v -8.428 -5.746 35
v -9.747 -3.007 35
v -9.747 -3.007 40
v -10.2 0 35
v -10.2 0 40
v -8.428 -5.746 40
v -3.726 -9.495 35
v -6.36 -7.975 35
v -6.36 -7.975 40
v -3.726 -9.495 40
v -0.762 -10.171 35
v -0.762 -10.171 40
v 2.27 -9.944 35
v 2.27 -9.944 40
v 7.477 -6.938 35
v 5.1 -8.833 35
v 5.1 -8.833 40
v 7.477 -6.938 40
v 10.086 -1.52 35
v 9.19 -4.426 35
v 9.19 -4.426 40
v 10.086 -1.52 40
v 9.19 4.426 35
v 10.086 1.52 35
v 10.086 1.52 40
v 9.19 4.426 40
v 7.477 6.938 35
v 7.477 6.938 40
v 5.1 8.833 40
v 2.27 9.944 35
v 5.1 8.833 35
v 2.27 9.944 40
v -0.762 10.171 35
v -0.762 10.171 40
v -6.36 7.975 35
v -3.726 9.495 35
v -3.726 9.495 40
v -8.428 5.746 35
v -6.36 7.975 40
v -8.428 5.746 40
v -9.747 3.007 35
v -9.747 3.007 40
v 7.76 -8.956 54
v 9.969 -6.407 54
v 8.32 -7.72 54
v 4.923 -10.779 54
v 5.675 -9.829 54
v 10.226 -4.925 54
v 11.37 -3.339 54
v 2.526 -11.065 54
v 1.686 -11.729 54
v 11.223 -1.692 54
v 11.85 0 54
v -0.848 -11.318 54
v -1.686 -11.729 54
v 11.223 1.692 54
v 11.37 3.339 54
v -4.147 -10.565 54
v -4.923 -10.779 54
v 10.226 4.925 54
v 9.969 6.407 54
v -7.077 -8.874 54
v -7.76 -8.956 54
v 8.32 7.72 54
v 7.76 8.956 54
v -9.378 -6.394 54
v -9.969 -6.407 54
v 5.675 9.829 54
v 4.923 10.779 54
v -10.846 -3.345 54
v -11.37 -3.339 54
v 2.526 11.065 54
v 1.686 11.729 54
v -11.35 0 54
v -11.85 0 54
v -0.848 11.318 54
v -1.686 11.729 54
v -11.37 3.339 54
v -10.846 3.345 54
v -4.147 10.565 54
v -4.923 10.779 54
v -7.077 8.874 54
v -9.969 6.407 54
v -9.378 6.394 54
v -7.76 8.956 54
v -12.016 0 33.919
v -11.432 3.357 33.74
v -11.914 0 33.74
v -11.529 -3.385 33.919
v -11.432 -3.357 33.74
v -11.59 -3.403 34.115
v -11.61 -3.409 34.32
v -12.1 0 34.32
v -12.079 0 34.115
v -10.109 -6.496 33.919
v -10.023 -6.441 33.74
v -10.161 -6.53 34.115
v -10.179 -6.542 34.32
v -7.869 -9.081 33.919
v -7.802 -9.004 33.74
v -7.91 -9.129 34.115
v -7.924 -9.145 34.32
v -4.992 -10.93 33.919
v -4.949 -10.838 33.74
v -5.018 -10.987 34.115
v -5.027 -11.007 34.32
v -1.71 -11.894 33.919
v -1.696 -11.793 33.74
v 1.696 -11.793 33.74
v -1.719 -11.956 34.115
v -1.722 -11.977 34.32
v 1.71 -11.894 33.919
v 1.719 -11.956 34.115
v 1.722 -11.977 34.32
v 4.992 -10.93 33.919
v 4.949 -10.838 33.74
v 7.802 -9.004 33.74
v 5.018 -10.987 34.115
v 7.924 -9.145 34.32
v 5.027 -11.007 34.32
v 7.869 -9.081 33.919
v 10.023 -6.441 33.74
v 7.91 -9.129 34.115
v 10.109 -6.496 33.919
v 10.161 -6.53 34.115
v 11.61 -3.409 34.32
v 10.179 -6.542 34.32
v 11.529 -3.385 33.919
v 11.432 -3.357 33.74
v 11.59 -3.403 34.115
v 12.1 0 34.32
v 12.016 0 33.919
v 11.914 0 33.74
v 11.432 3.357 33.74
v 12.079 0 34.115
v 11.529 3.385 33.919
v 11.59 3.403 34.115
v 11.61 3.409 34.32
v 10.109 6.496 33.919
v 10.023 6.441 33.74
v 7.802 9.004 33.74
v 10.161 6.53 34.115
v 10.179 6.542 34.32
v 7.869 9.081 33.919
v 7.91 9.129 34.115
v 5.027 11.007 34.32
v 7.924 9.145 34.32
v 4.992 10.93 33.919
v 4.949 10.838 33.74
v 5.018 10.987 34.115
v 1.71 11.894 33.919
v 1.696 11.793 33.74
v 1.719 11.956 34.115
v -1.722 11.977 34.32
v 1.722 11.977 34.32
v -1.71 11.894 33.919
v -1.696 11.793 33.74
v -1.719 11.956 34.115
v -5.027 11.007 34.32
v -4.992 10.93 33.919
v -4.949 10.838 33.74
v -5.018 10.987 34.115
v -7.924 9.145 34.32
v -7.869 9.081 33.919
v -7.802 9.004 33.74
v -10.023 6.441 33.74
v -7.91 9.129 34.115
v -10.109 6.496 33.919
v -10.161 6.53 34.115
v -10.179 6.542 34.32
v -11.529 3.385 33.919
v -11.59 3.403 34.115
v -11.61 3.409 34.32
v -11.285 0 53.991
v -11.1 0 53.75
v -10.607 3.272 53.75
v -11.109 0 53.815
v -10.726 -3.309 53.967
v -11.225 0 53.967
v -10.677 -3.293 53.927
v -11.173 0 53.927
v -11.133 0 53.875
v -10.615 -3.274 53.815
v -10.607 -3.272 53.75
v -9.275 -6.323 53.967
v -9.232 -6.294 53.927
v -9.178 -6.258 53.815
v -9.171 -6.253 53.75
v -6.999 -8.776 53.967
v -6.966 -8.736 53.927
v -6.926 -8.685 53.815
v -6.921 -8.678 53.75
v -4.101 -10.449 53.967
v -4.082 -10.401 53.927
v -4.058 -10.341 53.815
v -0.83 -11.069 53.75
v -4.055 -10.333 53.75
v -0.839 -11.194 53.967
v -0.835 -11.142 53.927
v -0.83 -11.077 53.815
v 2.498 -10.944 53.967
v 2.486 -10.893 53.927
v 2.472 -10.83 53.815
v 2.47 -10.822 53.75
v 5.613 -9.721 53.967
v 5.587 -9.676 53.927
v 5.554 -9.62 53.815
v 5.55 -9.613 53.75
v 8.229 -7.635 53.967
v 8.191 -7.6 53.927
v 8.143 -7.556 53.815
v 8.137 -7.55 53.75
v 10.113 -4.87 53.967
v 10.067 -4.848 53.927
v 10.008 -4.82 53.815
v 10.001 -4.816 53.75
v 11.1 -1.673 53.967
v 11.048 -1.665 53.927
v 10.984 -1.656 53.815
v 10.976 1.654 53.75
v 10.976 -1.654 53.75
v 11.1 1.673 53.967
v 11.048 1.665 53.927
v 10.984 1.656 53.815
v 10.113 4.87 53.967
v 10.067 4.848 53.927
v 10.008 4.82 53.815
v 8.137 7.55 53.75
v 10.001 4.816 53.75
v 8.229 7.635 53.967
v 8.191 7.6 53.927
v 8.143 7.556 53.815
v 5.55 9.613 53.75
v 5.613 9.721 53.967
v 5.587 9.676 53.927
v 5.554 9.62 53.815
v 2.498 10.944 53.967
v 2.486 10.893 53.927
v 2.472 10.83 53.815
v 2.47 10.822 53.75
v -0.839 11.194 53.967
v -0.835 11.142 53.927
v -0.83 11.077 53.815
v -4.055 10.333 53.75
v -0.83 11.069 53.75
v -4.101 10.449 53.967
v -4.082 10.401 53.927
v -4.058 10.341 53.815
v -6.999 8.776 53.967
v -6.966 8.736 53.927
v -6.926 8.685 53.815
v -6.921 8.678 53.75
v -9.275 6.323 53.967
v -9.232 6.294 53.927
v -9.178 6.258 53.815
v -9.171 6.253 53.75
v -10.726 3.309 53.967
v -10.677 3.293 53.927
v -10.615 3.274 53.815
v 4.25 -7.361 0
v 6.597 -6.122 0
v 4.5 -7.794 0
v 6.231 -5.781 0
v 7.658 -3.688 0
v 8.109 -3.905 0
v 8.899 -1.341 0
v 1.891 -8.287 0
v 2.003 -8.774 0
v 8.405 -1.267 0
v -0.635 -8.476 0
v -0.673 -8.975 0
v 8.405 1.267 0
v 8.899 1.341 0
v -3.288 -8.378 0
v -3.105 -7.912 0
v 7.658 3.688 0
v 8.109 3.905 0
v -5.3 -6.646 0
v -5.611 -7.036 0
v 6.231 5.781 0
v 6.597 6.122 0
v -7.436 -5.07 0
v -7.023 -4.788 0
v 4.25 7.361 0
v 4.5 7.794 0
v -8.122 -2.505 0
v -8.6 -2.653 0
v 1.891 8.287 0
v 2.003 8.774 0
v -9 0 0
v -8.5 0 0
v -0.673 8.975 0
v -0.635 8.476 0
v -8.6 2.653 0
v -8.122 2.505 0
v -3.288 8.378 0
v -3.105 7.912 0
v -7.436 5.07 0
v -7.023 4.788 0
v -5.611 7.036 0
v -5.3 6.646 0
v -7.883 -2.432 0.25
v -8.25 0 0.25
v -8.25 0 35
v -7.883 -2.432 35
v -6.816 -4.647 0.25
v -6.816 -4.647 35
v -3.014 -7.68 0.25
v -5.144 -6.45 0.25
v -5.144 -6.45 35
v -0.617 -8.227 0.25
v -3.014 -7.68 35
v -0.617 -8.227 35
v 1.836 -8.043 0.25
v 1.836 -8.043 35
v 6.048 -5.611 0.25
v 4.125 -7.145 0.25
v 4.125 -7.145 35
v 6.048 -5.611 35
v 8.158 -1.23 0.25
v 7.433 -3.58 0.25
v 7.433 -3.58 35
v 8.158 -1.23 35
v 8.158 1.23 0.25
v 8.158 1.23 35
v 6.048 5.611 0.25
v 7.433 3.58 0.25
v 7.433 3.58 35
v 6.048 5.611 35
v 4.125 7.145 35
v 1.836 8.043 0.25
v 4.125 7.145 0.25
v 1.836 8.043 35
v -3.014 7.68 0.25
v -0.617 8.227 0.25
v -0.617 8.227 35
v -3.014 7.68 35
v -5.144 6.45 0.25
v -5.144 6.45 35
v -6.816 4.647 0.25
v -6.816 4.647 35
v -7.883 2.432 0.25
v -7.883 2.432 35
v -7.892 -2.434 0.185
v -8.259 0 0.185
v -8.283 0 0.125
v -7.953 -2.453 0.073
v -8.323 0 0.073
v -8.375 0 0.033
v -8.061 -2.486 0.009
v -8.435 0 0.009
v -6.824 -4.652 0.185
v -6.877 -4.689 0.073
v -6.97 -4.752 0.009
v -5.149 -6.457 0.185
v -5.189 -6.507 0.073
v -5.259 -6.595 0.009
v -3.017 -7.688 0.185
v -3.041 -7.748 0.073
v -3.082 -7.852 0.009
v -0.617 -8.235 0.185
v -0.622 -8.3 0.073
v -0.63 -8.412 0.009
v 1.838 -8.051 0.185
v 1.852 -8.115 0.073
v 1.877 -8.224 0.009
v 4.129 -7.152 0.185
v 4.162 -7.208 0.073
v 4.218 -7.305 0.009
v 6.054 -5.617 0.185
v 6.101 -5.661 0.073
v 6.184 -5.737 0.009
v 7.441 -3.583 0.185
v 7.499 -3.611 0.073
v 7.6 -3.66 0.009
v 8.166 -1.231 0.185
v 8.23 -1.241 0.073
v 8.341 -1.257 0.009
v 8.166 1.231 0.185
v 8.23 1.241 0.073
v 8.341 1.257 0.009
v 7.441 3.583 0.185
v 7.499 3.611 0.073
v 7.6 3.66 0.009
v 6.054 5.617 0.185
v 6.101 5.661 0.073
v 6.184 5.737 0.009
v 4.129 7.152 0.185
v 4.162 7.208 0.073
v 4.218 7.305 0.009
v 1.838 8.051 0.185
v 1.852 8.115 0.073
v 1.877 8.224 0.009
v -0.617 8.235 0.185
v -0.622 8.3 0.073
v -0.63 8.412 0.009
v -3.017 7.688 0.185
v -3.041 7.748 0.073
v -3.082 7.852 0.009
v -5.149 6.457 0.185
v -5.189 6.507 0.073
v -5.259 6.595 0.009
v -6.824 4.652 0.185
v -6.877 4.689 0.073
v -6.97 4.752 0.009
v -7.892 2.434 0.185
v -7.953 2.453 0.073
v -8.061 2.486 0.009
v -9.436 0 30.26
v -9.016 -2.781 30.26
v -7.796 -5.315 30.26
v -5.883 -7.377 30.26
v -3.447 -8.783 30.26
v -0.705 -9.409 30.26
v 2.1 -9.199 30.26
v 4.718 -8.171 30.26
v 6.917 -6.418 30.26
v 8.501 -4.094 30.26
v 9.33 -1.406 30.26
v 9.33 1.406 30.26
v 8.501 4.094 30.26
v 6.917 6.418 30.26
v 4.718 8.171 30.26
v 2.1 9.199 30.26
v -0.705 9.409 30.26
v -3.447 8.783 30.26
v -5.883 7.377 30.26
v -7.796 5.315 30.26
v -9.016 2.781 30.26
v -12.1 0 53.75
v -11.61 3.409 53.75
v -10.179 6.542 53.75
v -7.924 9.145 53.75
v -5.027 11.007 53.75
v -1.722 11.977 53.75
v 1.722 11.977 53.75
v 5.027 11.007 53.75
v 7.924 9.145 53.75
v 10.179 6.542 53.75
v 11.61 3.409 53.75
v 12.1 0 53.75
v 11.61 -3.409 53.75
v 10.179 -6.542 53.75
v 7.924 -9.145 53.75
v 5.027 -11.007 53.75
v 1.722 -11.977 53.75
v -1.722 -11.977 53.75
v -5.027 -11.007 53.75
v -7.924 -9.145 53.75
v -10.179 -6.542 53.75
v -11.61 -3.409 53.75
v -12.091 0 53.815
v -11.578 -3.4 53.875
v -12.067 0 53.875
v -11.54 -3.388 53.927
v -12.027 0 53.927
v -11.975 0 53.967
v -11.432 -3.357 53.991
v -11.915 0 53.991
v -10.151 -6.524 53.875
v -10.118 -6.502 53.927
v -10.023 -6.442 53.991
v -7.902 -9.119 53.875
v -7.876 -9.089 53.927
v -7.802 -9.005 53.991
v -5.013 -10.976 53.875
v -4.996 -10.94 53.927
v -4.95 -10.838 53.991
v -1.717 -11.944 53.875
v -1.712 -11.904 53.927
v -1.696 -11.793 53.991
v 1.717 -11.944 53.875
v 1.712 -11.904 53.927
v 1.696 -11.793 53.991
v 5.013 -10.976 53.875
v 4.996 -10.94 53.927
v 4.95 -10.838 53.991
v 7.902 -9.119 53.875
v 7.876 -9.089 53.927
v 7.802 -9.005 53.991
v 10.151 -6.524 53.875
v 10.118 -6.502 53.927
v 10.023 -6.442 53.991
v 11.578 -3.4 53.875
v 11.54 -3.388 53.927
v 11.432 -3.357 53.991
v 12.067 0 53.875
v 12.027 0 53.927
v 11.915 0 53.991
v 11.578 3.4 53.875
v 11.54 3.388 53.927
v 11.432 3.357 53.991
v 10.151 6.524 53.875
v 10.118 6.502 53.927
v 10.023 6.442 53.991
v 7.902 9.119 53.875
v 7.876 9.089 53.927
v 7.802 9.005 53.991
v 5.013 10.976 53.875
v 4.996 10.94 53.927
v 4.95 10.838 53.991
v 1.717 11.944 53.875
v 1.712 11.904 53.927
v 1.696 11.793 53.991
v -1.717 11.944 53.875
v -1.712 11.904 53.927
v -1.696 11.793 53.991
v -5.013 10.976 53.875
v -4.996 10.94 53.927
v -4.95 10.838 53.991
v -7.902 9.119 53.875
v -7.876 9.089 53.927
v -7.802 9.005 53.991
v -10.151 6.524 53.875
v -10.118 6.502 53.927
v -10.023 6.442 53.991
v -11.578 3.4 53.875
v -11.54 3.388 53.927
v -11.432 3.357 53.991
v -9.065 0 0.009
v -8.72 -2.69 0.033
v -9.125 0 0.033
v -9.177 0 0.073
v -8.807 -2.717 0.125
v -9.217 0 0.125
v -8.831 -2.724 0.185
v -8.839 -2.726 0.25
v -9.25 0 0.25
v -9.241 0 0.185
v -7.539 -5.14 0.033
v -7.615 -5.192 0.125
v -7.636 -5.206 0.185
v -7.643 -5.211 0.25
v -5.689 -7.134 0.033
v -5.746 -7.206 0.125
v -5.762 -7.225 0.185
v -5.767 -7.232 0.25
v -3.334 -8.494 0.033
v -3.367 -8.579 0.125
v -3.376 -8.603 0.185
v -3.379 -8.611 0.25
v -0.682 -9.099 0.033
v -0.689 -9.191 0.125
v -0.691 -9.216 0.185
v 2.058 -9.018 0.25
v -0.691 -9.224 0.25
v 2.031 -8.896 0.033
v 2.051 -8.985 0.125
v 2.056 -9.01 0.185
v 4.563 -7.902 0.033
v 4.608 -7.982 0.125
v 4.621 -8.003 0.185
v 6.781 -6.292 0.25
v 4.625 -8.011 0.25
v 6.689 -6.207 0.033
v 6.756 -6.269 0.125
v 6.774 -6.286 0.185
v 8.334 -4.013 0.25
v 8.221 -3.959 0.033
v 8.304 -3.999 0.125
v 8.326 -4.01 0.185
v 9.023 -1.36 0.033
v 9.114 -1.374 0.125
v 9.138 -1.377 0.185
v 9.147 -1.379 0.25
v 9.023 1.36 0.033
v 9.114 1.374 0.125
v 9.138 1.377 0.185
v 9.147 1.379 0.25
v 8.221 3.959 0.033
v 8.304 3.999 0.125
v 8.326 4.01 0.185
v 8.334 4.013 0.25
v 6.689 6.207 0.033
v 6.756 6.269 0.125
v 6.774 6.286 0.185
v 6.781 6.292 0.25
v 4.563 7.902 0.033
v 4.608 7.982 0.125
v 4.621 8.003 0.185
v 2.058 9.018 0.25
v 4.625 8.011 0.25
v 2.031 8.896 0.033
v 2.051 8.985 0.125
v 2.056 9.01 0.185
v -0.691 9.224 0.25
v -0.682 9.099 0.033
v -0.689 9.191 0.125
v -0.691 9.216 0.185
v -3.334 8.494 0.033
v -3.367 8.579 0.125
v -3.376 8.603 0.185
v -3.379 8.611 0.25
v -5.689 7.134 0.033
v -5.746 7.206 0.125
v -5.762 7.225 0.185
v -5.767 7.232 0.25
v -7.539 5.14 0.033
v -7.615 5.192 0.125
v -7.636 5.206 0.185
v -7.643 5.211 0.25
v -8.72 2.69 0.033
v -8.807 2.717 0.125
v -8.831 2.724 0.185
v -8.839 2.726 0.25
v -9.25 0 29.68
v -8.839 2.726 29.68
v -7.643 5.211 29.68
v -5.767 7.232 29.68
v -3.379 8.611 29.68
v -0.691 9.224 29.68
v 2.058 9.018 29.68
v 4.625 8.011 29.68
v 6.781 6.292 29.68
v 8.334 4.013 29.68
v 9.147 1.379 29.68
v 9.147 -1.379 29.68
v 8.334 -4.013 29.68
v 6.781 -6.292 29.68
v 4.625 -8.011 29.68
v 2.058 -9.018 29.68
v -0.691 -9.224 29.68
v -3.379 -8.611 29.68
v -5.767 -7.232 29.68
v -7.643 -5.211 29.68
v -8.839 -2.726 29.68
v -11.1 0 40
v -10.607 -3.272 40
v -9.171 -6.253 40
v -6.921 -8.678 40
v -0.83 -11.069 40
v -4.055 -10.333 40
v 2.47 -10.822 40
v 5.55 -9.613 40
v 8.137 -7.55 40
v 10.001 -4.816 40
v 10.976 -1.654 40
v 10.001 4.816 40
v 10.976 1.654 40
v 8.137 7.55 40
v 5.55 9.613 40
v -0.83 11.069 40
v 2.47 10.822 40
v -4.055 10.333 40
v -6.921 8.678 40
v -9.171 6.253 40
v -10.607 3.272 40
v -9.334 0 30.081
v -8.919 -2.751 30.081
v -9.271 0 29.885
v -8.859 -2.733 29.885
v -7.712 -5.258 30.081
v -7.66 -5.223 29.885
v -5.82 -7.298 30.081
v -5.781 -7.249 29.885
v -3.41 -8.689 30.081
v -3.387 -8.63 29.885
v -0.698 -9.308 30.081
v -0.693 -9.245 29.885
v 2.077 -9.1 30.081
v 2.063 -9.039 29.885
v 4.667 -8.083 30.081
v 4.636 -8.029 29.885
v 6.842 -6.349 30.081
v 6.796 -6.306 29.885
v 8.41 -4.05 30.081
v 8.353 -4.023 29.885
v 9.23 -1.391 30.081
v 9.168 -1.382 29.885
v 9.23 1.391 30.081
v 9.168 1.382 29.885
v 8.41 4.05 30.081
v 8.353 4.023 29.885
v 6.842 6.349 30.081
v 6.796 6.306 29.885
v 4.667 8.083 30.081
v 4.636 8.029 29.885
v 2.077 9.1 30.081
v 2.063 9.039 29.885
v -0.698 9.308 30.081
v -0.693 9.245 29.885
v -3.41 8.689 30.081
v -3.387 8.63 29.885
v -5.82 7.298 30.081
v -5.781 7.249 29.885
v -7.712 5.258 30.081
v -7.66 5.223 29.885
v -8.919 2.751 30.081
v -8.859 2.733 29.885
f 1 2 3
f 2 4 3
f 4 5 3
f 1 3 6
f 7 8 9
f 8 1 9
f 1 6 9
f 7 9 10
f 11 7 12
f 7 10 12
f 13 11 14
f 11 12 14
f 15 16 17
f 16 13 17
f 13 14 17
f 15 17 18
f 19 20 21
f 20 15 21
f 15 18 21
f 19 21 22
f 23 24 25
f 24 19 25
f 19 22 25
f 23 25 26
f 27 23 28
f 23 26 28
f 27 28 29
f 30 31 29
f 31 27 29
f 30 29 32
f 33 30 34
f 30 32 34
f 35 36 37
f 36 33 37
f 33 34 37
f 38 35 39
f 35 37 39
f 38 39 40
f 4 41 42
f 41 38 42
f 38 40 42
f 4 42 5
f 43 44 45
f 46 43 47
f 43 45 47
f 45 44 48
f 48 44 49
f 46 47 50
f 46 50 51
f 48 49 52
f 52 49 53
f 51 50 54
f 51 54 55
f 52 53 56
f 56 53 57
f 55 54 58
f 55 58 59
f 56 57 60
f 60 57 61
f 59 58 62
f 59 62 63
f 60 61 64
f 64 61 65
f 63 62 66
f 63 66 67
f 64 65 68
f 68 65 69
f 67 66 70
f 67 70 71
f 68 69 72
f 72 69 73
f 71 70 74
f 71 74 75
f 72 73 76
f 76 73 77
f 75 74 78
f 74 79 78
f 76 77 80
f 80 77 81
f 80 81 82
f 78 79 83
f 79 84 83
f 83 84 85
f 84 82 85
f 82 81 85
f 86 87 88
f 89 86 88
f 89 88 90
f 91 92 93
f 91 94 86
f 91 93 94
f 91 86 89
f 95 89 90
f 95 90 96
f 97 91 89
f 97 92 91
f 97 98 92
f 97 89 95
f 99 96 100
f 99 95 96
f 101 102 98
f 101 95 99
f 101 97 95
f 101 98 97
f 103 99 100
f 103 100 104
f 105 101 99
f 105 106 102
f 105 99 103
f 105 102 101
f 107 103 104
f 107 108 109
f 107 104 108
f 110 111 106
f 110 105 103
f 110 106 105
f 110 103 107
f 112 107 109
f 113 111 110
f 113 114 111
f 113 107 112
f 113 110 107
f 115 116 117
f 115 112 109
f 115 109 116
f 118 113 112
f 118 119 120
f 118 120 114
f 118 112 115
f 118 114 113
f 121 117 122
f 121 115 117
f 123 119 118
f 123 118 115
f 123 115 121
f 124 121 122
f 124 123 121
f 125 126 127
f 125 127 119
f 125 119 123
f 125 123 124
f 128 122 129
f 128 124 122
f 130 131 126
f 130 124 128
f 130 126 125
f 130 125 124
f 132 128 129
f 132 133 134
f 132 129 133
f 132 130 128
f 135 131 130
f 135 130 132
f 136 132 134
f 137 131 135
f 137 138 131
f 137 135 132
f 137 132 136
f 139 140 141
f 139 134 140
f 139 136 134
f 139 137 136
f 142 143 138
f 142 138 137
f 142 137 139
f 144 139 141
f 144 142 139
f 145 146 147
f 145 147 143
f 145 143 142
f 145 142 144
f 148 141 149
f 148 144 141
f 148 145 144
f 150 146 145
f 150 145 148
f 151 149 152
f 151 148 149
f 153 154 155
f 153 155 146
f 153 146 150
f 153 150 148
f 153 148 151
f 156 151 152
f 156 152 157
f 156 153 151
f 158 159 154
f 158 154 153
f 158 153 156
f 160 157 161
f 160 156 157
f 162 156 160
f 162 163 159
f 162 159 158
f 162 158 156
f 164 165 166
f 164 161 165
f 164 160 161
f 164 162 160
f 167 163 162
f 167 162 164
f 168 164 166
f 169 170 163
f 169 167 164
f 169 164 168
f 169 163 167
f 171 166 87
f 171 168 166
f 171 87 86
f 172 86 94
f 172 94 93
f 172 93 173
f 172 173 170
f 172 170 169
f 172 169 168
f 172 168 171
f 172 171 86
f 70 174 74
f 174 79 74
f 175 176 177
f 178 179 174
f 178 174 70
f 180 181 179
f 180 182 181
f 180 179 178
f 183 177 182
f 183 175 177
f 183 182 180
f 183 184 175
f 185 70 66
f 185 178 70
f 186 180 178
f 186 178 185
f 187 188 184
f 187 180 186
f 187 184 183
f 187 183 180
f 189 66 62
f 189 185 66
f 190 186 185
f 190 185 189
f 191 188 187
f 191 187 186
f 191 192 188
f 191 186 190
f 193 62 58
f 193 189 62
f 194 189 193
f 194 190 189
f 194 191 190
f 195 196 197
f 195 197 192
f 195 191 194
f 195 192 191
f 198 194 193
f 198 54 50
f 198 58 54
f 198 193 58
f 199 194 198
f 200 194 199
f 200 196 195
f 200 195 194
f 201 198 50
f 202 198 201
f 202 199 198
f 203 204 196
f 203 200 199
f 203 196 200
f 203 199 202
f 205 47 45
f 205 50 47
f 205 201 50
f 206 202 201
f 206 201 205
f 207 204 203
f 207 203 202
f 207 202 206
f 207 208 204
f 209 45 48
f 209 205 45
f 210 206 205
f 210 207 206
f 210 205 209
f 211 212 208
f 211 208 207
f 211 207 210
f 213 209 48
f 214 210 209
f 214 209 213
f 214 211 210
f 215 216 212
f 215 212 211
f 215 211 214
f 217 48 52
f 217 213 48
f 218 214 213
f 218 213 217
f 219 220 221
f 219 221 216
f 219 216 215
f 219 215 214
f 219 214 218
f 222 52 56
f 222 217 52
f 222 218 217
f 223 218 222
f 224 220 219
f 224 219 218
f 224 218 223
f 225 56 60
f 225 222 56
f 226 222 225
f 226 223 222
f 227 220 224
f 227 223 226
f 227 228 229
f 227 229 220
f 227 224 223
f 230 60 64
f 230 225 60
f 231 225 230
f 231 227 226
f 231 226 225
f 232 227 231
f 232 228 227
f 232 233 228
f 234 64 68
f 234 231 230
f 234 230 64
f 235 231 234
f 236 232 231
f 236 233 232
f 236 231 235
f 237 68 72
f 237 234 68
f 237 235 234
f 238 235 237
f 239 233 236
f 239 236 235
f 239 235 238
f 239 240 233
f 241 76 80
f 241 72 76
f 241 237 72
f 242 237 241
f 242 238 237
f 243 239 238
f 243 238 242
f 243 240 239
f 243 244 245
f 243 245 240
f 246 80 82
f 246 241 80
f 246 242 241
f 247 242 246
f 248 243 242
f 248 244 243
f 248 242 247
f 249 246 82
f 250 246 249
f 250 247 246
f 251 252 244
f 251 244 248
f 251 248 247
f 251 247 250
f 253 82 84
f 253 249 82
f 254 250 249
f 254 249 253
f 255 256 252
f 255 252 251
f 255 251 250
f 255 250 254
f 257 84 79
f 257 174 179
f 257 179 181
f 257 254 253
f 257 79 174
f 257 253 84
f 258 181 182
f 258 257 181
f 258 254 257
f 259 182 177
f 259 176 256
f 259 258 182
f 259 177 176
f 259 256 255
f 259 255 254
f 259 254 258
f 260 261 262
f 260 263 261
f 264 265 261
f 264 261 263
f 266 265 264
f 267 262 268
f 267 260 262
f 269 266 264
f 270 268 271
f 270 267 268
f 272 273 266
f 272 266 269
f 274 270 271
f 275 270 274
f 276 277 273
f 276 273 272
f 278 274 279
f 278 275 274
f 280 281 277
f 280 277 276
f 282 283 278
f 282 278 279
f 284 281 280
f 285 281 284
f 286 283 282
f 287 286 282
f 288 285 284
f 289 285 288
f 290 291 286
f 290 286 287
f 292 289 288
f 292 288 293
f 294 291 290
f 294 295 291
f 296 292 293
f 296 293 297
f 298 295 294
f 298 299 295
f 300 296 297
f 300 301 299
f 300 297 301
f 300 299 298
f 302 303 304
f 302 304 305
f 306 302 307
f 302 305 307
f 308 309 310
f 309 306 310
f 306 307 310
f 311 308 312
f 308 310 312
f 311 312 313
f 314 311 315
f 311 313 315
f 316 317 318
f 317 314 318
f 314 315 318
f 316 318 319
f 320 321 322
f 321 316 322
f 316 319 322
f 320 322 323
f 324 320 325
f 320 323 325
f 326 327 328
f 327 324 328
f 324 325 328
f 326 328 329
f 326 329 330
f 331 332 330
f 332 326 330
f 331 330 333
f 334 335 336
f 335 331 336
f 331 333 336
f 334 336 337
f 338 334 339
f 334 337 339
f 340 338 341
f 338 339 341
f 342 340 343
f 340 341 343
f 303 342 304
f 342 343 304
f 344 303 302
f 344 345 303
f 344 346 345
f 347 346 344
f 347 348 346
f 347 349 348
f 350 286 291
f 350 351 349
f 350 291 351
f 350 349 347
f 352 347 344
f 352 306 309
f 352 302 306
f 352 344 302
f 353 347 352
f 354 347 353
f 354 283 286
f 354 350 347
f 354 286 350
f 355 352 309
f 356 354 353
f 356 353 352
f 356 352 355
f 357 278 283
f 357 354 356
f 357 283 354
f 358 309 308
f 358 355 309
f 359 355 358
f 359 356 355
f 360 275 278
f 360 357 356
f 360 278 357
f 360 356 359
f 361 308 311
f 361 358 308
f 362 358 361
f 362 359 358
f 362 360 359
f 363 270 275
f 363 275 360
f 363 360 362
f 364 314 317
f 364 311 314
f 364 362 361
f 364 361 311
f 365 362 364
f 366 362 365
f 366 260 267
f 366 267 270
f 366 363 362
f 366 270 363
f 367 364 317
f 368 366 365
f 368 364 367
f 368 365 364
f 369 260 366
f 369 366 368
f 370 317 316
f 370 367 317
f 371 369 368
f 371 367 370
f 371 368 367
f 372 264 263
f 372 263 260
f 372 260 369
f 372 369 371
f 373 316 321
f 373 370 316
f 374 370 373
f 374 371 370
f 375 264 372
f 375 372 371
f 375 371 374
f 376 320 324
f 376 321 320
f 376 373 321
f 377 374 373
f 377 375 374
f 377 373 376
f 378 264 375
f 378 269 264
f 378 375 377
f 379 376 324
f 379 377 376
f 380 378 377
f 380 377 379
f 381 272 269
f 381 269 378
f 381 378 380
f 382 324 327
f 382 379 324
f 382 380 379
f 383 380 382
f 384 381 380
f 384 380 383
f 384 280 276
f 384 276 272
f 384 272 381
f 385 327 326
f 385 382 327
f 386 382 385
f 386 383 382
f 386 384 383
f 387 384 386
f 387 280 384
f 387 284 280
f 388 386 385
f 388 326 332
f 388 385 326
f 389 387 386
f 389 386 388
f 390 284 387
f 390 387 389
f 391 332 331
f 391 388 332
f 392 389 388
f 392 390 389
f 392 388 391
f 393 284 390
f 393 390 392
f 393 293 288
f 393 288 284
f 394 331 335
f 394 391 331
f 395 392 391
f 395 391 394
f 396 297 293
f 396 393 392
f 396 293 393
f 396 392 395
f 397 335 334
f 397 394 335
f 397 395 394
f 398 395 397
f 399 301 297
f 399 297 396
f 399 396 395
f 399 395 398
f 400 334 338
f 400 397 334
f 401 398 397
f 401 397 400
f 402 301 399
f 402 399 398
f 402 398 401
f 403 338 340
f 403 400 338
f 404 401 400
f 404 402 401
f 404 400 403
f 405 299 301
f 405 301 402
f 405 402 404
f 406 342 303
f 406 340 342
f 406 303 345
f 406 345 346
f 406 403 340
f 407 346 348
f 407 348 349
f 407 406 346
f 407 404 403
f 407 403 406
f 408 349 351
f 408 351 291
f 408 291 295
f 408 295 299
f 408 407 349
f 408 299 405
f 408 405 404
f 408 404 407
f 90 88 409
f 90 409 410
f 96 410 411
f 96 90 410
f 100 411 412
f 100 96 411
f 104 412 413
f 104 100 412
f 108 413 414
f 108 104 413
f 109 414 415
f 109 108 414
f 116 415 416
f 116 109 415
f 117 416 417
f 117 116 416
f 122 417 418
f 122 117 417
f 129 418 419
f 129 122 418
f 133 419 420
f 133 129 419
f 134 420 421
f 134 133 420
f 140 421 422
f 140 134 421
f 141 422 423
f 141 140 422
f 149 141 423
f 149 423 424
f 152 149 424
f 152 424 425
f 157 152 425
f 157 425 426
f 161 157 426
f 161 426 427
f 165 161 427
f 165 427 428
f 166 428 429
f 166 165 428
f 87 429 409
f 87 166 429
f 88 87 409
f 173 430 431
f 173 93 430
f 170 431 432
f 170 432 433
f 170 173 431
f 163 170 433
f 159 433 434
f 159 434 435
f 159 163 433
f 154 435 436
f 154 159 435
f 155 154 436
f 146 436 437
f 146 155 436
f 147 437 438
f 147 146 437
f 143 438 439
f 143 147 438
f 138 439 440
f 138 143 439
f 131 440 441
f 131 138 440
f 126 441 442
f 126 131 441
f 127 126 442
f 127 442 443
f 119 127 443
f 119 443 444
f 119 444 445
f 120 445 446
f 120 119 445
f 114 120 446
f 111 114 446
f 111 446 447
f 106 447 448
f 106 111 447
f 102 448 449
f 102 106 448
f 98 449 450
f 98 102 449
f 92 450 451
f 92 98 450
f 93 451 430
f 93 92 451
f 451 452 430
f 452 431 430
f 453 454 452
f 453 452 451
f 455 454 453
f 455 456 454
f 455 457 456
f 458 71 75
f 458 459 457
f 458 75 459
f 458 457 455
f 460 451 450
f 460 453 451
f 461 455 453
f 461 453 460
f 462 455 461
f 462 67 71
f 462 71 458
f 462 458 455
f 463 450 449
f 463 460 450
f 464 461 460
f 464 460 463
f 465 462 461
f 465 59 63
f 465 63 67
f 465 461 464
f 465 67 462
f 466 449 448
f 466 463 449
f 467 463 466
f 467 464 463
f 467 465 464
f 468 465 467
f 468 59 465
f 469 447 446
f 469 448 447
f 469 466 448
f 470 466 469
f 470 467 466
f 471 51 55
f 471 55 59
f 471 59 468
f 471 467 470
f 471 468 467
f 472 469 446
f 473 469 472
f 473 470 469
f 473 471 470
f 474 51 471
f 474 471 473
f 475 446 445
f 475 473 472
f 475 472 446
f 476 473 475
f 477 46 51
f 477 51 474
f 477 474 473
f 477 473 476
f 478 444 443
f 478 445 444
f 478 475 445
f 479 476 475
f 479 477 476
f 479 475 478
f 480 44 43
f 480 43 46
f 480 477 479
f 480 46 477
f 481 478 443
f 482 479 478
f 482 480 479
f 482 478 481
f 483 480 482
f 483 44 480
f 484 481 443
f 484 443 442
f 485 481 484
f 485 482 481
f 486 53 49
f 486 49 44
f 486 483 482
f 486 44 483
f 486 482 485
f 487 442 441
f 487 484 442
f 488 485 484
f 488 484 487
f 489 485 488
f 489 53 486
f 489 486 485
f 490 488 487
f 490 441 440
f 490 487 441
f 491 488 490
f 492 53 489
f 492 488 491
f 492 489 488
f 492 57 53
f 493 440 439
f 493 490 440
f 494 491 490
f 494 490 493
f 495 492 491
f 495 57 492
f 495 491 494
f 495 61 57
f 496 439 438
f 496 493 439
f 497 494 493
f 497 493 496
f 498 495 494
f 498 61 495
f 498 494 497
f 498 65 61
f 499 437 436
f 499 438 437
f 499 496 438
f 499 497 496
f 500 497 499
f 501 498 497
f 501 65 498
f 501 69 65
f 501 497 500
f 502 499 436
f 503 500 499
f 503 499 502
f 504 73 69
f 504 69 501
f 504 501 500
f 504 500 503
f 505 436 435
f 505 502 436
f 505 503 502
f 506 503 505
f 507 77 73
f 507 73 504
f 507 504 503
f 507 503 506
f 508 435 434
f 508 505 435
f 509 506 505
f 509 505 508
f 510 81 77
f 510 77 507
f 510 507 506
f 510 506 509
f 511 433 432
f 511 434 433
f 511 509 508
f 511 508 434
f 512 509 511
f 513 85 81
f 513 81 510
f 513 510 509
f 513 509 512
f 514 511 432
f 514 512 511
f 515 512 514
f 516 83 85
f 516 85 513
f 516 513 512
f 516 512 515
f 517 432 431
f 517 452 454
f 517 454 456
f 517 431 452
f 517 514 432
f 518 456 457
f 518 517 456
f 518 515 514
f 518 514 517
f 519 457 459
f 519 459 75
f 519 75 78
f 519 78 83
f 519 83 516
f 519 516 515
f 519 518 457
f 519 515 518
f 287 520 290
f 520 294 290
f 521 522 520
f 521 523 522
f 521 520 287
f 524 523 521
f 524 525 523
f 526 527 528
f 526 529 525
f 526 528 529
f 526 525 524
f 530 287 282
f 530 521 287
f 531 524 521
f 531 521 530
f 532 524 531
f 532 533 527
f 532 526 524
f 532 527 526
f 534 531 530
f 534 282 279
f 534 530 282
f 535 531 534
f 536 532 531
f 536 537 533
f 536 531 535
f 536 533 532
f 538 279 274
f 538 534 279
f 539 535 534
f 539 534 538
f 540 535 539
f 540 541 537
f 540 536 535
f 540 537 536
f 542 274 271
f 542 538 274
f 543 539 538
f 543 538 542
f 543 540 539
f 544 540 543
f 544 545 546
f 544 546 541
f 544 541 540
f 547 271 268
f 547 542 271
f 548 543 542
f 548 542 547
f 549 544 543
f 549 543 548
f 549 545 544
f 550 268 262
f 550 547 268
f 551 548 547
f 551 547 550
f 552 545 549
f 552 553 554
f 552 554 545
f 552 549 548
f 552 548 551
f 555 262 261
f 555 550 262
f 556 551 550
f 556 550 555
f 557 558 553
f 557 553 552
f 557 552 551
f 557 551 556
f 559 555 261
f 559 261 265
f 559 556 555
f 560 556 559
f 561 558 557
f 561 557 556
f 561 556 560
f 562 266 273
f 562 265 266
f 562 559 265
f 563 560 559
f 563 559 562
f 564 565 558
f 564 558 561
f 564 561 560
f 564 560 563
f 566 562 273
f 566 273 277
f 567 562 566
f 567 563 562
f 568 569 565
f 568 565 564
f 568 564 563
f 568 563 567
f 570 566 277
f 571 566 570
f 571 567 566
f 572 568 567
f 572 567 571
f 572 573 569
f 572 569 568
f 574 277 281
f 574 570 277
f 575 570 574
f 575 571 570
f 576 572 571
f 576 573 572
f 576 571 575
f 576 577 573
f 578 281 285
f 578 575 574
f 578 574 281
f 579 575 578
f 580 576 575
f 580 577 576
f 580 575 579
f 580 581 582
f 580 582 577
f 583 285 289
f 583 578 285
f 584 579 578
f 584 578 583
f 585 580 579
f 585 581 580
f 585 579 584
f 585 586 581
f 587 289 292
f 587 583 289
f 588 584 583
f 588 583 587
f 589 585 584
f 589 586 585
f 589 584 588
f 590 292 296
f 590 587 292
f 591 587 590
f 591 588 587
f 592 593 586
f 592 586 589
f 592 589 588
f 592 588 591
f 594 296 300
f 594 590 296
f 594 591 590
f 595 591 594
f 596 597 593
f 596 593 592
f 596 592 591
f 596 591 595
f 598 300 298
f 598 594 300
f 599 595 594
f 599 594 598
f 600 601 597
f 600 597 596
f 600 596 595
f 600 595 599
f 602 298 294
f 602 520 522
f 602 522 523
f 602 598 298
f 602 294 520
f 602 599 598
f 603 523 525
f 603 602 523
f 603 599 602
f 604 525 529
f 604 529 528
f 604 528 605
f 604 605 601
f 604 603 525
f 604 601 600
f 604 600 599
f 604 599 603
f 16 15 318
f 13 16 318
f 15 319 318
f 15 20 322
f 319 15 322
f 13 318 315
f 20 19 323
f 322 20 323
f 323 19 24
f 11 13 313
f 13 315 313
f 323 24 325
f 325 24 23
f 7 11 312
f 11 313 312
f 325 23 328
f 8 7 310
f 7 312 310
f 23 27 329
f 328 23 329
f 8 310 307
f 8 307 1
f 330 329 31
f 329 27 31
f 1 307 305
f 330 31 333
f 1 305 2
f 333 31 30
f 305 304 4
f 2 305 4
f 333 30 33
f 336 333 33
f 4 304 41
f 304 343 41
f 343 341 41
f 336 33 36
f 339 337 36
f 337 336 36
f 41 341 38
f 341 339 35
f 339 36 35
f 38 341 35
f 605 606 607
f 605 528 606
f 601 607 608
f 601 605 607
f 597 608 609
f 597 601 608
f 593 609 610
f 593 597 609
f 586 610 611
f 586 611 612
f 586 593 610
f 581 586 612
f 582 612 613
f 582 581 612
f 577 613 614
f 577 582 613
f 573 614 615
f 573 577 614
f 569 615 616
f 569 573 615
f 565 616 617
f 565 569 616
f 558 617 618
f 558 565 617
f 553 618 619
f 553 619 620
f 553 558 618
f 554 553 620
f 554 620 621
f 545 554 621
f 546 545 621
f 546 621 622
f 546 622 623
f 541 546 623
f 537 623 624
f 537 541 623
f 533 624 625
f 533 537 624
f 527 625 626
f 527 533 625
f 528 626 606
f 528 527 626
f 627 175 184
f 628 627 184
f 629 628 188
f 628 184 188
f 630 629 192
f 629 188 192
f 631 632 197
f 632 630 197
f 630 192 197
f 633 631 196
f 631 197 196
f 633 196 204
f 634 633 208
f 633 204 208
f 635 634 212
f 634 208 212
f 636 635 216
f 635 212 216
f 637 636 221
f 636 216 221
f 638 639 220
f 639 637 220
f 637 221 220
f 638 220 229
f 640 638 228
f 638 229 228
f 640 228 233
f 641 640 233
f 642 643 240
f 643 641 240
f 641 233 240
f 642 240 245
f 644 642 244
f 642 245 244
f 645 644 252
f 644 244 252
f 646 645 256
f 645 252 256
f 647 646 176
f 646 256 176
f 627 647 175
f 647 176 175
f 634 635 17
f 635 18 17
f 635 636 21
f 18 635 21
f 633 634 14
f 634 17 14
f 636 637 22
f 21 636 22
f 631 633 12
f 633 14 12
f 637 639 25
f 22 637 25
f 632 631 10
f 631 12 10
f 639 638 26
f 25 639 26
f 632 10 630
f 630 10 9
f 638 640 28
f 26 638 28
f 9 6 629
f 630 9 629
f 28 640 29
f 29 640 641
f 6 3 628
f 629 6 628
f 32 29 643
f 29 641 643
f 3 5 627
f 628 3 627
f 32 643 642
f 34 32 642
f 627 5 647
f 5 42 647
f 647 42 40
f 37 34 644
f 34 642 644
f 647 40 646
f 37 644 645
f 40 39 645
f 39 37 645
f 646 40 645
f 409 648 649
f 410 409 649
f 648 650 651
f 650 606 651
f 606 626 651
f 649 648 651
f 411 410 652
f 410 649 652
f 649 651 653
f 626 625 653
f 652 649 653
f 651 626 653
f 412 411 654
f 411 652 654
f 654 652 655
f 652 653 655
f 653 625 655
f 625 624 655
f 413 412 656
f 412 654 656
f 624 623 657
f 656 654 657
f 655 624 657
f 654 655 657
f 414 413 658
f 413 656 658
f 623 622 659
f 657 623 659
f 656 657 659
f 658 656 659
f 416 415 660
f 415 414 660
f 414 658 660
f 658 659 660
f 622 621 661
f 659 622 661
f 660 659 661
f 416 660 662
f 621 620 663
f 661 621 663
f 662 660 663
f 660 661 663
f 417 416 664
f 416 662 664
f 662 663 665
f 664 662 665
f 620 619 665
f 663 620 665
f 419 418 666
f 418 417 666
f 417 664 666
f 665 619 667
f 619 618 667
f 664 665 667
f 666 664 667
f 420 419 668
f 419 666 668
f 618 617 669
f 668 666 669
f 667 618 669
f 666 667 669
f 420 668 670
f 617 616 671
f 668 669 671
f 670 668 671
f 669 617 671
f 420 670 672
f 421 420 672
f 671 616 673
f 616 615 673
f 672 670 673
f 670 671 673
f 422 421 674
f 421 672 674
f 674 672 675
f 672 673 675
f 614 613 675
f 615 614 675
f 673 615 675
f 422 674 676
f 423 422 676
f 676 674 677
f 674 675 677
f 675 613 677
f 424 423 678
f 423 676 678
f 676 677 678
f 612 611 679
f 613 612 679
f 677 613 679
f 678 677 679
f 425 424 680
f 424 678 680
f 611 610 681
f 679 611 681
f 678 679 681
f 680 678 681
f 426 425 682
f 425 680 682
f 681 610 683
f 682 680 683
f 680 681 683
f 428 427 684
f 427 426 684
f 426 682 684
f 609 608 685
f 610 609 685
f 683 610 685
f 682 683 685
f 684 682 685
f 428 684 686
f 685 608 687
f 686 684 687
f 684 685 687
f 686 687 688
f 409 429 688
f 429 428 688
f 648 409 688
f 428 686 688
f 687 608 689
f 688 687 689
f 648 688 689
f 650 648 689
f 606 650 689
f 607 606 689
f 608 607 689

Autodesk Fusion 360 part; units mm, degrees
sketch "スケッチ1" plane through (0, 0, 0) normal (0, 1, 0) x (1, 0, 0)
  line L0 (0, -73.6187) -> (0, 8) construction
  line L1 (-8.25, -0.25) -> (-8.25, -35)
  line L2 (-8.25, -35) -> (-10.2, -35)
  line L3 (-10.2, -35) -> (-10.2, -40)
  line L4 (-10.2, -40) -> (-11.1, -40)
  line L5 (-11.1, -40) -> (-11.1, -53.75)
  line L6 (-11.35, -54) -> (-11.85, -54)
  line L7 (-12.1, -53.75) -> (-12.1, -34.3198)
  line L8 (-11.9144, -33.7395) -> (-9.4356, -30.2605)
  line L9 (-9.25, -29.6802) -> (-9.25, -0.25)
  line L10 (-9, 0) -> (-8.5, 0)
  arc A0 (-9, 0) -> (-9.25, -0.25) centre (-9, -0.25) ccw
  arc A1 (-8.25, -0.25) -> (-8.5, 0) centre (-8.5, -0.25) ccw
  arc A2 (-9.4356, -30.2605) -> (-9.25, -29.6802) centre (-10.25, -29.6802) ccw
  arc A3 (-11.9144, -33.7395) -> (-12.1, -34.3198) centre (-11.1, -34.3198) ccw
  arc A4 (-12.1, -53.75) -> (-11.85, -54) centre (-11.85, -53.75) ccw
  arc A5 (-11.35, -54) -> (-11.1, -53.75) centre (-11.35, -53.75) ccw
  point P0 (-8.25, 0)
  point P1 (-11.0999, -54)
  point P2 (-12.1, -54)
  point P3 (-12.1, -34)
  point P4 (-9.25, -30)
  point P5 (-9.25, 0)
  dimension "d5" = 5
  dimension "d6" = 14
  dimension "d7" = 35
  dimension "d8" = 1
  dimension "d9" = 1
  dimension "d10" = 20
  dimension "d11" = 30
  dimension "d12" = 0.25
  dimension "d13" = 0.25
  dimension "d16" = 1
  dimension "d17" = 1
  dimension "d18" = 0.25
  dimension "d19" = 0.25
  dimension "d23" = 8.25
  dimension "d24" = 10.2
  dimension "d25" = 11.1
revolve "回転6" add sketch "スケッチ1" angle 360 about axis through (0, 0, 73.6187) along (0, 0, -1)
revolve "回転4" [suppressed]
equation "d23 = ( 16.5 / 2 ) * 1 mm"
equation "d24 = ( 20.4 / 2 ) * 1 mm"
equation "d25 = ( 22.2 / 2 ) * 1 mm"
